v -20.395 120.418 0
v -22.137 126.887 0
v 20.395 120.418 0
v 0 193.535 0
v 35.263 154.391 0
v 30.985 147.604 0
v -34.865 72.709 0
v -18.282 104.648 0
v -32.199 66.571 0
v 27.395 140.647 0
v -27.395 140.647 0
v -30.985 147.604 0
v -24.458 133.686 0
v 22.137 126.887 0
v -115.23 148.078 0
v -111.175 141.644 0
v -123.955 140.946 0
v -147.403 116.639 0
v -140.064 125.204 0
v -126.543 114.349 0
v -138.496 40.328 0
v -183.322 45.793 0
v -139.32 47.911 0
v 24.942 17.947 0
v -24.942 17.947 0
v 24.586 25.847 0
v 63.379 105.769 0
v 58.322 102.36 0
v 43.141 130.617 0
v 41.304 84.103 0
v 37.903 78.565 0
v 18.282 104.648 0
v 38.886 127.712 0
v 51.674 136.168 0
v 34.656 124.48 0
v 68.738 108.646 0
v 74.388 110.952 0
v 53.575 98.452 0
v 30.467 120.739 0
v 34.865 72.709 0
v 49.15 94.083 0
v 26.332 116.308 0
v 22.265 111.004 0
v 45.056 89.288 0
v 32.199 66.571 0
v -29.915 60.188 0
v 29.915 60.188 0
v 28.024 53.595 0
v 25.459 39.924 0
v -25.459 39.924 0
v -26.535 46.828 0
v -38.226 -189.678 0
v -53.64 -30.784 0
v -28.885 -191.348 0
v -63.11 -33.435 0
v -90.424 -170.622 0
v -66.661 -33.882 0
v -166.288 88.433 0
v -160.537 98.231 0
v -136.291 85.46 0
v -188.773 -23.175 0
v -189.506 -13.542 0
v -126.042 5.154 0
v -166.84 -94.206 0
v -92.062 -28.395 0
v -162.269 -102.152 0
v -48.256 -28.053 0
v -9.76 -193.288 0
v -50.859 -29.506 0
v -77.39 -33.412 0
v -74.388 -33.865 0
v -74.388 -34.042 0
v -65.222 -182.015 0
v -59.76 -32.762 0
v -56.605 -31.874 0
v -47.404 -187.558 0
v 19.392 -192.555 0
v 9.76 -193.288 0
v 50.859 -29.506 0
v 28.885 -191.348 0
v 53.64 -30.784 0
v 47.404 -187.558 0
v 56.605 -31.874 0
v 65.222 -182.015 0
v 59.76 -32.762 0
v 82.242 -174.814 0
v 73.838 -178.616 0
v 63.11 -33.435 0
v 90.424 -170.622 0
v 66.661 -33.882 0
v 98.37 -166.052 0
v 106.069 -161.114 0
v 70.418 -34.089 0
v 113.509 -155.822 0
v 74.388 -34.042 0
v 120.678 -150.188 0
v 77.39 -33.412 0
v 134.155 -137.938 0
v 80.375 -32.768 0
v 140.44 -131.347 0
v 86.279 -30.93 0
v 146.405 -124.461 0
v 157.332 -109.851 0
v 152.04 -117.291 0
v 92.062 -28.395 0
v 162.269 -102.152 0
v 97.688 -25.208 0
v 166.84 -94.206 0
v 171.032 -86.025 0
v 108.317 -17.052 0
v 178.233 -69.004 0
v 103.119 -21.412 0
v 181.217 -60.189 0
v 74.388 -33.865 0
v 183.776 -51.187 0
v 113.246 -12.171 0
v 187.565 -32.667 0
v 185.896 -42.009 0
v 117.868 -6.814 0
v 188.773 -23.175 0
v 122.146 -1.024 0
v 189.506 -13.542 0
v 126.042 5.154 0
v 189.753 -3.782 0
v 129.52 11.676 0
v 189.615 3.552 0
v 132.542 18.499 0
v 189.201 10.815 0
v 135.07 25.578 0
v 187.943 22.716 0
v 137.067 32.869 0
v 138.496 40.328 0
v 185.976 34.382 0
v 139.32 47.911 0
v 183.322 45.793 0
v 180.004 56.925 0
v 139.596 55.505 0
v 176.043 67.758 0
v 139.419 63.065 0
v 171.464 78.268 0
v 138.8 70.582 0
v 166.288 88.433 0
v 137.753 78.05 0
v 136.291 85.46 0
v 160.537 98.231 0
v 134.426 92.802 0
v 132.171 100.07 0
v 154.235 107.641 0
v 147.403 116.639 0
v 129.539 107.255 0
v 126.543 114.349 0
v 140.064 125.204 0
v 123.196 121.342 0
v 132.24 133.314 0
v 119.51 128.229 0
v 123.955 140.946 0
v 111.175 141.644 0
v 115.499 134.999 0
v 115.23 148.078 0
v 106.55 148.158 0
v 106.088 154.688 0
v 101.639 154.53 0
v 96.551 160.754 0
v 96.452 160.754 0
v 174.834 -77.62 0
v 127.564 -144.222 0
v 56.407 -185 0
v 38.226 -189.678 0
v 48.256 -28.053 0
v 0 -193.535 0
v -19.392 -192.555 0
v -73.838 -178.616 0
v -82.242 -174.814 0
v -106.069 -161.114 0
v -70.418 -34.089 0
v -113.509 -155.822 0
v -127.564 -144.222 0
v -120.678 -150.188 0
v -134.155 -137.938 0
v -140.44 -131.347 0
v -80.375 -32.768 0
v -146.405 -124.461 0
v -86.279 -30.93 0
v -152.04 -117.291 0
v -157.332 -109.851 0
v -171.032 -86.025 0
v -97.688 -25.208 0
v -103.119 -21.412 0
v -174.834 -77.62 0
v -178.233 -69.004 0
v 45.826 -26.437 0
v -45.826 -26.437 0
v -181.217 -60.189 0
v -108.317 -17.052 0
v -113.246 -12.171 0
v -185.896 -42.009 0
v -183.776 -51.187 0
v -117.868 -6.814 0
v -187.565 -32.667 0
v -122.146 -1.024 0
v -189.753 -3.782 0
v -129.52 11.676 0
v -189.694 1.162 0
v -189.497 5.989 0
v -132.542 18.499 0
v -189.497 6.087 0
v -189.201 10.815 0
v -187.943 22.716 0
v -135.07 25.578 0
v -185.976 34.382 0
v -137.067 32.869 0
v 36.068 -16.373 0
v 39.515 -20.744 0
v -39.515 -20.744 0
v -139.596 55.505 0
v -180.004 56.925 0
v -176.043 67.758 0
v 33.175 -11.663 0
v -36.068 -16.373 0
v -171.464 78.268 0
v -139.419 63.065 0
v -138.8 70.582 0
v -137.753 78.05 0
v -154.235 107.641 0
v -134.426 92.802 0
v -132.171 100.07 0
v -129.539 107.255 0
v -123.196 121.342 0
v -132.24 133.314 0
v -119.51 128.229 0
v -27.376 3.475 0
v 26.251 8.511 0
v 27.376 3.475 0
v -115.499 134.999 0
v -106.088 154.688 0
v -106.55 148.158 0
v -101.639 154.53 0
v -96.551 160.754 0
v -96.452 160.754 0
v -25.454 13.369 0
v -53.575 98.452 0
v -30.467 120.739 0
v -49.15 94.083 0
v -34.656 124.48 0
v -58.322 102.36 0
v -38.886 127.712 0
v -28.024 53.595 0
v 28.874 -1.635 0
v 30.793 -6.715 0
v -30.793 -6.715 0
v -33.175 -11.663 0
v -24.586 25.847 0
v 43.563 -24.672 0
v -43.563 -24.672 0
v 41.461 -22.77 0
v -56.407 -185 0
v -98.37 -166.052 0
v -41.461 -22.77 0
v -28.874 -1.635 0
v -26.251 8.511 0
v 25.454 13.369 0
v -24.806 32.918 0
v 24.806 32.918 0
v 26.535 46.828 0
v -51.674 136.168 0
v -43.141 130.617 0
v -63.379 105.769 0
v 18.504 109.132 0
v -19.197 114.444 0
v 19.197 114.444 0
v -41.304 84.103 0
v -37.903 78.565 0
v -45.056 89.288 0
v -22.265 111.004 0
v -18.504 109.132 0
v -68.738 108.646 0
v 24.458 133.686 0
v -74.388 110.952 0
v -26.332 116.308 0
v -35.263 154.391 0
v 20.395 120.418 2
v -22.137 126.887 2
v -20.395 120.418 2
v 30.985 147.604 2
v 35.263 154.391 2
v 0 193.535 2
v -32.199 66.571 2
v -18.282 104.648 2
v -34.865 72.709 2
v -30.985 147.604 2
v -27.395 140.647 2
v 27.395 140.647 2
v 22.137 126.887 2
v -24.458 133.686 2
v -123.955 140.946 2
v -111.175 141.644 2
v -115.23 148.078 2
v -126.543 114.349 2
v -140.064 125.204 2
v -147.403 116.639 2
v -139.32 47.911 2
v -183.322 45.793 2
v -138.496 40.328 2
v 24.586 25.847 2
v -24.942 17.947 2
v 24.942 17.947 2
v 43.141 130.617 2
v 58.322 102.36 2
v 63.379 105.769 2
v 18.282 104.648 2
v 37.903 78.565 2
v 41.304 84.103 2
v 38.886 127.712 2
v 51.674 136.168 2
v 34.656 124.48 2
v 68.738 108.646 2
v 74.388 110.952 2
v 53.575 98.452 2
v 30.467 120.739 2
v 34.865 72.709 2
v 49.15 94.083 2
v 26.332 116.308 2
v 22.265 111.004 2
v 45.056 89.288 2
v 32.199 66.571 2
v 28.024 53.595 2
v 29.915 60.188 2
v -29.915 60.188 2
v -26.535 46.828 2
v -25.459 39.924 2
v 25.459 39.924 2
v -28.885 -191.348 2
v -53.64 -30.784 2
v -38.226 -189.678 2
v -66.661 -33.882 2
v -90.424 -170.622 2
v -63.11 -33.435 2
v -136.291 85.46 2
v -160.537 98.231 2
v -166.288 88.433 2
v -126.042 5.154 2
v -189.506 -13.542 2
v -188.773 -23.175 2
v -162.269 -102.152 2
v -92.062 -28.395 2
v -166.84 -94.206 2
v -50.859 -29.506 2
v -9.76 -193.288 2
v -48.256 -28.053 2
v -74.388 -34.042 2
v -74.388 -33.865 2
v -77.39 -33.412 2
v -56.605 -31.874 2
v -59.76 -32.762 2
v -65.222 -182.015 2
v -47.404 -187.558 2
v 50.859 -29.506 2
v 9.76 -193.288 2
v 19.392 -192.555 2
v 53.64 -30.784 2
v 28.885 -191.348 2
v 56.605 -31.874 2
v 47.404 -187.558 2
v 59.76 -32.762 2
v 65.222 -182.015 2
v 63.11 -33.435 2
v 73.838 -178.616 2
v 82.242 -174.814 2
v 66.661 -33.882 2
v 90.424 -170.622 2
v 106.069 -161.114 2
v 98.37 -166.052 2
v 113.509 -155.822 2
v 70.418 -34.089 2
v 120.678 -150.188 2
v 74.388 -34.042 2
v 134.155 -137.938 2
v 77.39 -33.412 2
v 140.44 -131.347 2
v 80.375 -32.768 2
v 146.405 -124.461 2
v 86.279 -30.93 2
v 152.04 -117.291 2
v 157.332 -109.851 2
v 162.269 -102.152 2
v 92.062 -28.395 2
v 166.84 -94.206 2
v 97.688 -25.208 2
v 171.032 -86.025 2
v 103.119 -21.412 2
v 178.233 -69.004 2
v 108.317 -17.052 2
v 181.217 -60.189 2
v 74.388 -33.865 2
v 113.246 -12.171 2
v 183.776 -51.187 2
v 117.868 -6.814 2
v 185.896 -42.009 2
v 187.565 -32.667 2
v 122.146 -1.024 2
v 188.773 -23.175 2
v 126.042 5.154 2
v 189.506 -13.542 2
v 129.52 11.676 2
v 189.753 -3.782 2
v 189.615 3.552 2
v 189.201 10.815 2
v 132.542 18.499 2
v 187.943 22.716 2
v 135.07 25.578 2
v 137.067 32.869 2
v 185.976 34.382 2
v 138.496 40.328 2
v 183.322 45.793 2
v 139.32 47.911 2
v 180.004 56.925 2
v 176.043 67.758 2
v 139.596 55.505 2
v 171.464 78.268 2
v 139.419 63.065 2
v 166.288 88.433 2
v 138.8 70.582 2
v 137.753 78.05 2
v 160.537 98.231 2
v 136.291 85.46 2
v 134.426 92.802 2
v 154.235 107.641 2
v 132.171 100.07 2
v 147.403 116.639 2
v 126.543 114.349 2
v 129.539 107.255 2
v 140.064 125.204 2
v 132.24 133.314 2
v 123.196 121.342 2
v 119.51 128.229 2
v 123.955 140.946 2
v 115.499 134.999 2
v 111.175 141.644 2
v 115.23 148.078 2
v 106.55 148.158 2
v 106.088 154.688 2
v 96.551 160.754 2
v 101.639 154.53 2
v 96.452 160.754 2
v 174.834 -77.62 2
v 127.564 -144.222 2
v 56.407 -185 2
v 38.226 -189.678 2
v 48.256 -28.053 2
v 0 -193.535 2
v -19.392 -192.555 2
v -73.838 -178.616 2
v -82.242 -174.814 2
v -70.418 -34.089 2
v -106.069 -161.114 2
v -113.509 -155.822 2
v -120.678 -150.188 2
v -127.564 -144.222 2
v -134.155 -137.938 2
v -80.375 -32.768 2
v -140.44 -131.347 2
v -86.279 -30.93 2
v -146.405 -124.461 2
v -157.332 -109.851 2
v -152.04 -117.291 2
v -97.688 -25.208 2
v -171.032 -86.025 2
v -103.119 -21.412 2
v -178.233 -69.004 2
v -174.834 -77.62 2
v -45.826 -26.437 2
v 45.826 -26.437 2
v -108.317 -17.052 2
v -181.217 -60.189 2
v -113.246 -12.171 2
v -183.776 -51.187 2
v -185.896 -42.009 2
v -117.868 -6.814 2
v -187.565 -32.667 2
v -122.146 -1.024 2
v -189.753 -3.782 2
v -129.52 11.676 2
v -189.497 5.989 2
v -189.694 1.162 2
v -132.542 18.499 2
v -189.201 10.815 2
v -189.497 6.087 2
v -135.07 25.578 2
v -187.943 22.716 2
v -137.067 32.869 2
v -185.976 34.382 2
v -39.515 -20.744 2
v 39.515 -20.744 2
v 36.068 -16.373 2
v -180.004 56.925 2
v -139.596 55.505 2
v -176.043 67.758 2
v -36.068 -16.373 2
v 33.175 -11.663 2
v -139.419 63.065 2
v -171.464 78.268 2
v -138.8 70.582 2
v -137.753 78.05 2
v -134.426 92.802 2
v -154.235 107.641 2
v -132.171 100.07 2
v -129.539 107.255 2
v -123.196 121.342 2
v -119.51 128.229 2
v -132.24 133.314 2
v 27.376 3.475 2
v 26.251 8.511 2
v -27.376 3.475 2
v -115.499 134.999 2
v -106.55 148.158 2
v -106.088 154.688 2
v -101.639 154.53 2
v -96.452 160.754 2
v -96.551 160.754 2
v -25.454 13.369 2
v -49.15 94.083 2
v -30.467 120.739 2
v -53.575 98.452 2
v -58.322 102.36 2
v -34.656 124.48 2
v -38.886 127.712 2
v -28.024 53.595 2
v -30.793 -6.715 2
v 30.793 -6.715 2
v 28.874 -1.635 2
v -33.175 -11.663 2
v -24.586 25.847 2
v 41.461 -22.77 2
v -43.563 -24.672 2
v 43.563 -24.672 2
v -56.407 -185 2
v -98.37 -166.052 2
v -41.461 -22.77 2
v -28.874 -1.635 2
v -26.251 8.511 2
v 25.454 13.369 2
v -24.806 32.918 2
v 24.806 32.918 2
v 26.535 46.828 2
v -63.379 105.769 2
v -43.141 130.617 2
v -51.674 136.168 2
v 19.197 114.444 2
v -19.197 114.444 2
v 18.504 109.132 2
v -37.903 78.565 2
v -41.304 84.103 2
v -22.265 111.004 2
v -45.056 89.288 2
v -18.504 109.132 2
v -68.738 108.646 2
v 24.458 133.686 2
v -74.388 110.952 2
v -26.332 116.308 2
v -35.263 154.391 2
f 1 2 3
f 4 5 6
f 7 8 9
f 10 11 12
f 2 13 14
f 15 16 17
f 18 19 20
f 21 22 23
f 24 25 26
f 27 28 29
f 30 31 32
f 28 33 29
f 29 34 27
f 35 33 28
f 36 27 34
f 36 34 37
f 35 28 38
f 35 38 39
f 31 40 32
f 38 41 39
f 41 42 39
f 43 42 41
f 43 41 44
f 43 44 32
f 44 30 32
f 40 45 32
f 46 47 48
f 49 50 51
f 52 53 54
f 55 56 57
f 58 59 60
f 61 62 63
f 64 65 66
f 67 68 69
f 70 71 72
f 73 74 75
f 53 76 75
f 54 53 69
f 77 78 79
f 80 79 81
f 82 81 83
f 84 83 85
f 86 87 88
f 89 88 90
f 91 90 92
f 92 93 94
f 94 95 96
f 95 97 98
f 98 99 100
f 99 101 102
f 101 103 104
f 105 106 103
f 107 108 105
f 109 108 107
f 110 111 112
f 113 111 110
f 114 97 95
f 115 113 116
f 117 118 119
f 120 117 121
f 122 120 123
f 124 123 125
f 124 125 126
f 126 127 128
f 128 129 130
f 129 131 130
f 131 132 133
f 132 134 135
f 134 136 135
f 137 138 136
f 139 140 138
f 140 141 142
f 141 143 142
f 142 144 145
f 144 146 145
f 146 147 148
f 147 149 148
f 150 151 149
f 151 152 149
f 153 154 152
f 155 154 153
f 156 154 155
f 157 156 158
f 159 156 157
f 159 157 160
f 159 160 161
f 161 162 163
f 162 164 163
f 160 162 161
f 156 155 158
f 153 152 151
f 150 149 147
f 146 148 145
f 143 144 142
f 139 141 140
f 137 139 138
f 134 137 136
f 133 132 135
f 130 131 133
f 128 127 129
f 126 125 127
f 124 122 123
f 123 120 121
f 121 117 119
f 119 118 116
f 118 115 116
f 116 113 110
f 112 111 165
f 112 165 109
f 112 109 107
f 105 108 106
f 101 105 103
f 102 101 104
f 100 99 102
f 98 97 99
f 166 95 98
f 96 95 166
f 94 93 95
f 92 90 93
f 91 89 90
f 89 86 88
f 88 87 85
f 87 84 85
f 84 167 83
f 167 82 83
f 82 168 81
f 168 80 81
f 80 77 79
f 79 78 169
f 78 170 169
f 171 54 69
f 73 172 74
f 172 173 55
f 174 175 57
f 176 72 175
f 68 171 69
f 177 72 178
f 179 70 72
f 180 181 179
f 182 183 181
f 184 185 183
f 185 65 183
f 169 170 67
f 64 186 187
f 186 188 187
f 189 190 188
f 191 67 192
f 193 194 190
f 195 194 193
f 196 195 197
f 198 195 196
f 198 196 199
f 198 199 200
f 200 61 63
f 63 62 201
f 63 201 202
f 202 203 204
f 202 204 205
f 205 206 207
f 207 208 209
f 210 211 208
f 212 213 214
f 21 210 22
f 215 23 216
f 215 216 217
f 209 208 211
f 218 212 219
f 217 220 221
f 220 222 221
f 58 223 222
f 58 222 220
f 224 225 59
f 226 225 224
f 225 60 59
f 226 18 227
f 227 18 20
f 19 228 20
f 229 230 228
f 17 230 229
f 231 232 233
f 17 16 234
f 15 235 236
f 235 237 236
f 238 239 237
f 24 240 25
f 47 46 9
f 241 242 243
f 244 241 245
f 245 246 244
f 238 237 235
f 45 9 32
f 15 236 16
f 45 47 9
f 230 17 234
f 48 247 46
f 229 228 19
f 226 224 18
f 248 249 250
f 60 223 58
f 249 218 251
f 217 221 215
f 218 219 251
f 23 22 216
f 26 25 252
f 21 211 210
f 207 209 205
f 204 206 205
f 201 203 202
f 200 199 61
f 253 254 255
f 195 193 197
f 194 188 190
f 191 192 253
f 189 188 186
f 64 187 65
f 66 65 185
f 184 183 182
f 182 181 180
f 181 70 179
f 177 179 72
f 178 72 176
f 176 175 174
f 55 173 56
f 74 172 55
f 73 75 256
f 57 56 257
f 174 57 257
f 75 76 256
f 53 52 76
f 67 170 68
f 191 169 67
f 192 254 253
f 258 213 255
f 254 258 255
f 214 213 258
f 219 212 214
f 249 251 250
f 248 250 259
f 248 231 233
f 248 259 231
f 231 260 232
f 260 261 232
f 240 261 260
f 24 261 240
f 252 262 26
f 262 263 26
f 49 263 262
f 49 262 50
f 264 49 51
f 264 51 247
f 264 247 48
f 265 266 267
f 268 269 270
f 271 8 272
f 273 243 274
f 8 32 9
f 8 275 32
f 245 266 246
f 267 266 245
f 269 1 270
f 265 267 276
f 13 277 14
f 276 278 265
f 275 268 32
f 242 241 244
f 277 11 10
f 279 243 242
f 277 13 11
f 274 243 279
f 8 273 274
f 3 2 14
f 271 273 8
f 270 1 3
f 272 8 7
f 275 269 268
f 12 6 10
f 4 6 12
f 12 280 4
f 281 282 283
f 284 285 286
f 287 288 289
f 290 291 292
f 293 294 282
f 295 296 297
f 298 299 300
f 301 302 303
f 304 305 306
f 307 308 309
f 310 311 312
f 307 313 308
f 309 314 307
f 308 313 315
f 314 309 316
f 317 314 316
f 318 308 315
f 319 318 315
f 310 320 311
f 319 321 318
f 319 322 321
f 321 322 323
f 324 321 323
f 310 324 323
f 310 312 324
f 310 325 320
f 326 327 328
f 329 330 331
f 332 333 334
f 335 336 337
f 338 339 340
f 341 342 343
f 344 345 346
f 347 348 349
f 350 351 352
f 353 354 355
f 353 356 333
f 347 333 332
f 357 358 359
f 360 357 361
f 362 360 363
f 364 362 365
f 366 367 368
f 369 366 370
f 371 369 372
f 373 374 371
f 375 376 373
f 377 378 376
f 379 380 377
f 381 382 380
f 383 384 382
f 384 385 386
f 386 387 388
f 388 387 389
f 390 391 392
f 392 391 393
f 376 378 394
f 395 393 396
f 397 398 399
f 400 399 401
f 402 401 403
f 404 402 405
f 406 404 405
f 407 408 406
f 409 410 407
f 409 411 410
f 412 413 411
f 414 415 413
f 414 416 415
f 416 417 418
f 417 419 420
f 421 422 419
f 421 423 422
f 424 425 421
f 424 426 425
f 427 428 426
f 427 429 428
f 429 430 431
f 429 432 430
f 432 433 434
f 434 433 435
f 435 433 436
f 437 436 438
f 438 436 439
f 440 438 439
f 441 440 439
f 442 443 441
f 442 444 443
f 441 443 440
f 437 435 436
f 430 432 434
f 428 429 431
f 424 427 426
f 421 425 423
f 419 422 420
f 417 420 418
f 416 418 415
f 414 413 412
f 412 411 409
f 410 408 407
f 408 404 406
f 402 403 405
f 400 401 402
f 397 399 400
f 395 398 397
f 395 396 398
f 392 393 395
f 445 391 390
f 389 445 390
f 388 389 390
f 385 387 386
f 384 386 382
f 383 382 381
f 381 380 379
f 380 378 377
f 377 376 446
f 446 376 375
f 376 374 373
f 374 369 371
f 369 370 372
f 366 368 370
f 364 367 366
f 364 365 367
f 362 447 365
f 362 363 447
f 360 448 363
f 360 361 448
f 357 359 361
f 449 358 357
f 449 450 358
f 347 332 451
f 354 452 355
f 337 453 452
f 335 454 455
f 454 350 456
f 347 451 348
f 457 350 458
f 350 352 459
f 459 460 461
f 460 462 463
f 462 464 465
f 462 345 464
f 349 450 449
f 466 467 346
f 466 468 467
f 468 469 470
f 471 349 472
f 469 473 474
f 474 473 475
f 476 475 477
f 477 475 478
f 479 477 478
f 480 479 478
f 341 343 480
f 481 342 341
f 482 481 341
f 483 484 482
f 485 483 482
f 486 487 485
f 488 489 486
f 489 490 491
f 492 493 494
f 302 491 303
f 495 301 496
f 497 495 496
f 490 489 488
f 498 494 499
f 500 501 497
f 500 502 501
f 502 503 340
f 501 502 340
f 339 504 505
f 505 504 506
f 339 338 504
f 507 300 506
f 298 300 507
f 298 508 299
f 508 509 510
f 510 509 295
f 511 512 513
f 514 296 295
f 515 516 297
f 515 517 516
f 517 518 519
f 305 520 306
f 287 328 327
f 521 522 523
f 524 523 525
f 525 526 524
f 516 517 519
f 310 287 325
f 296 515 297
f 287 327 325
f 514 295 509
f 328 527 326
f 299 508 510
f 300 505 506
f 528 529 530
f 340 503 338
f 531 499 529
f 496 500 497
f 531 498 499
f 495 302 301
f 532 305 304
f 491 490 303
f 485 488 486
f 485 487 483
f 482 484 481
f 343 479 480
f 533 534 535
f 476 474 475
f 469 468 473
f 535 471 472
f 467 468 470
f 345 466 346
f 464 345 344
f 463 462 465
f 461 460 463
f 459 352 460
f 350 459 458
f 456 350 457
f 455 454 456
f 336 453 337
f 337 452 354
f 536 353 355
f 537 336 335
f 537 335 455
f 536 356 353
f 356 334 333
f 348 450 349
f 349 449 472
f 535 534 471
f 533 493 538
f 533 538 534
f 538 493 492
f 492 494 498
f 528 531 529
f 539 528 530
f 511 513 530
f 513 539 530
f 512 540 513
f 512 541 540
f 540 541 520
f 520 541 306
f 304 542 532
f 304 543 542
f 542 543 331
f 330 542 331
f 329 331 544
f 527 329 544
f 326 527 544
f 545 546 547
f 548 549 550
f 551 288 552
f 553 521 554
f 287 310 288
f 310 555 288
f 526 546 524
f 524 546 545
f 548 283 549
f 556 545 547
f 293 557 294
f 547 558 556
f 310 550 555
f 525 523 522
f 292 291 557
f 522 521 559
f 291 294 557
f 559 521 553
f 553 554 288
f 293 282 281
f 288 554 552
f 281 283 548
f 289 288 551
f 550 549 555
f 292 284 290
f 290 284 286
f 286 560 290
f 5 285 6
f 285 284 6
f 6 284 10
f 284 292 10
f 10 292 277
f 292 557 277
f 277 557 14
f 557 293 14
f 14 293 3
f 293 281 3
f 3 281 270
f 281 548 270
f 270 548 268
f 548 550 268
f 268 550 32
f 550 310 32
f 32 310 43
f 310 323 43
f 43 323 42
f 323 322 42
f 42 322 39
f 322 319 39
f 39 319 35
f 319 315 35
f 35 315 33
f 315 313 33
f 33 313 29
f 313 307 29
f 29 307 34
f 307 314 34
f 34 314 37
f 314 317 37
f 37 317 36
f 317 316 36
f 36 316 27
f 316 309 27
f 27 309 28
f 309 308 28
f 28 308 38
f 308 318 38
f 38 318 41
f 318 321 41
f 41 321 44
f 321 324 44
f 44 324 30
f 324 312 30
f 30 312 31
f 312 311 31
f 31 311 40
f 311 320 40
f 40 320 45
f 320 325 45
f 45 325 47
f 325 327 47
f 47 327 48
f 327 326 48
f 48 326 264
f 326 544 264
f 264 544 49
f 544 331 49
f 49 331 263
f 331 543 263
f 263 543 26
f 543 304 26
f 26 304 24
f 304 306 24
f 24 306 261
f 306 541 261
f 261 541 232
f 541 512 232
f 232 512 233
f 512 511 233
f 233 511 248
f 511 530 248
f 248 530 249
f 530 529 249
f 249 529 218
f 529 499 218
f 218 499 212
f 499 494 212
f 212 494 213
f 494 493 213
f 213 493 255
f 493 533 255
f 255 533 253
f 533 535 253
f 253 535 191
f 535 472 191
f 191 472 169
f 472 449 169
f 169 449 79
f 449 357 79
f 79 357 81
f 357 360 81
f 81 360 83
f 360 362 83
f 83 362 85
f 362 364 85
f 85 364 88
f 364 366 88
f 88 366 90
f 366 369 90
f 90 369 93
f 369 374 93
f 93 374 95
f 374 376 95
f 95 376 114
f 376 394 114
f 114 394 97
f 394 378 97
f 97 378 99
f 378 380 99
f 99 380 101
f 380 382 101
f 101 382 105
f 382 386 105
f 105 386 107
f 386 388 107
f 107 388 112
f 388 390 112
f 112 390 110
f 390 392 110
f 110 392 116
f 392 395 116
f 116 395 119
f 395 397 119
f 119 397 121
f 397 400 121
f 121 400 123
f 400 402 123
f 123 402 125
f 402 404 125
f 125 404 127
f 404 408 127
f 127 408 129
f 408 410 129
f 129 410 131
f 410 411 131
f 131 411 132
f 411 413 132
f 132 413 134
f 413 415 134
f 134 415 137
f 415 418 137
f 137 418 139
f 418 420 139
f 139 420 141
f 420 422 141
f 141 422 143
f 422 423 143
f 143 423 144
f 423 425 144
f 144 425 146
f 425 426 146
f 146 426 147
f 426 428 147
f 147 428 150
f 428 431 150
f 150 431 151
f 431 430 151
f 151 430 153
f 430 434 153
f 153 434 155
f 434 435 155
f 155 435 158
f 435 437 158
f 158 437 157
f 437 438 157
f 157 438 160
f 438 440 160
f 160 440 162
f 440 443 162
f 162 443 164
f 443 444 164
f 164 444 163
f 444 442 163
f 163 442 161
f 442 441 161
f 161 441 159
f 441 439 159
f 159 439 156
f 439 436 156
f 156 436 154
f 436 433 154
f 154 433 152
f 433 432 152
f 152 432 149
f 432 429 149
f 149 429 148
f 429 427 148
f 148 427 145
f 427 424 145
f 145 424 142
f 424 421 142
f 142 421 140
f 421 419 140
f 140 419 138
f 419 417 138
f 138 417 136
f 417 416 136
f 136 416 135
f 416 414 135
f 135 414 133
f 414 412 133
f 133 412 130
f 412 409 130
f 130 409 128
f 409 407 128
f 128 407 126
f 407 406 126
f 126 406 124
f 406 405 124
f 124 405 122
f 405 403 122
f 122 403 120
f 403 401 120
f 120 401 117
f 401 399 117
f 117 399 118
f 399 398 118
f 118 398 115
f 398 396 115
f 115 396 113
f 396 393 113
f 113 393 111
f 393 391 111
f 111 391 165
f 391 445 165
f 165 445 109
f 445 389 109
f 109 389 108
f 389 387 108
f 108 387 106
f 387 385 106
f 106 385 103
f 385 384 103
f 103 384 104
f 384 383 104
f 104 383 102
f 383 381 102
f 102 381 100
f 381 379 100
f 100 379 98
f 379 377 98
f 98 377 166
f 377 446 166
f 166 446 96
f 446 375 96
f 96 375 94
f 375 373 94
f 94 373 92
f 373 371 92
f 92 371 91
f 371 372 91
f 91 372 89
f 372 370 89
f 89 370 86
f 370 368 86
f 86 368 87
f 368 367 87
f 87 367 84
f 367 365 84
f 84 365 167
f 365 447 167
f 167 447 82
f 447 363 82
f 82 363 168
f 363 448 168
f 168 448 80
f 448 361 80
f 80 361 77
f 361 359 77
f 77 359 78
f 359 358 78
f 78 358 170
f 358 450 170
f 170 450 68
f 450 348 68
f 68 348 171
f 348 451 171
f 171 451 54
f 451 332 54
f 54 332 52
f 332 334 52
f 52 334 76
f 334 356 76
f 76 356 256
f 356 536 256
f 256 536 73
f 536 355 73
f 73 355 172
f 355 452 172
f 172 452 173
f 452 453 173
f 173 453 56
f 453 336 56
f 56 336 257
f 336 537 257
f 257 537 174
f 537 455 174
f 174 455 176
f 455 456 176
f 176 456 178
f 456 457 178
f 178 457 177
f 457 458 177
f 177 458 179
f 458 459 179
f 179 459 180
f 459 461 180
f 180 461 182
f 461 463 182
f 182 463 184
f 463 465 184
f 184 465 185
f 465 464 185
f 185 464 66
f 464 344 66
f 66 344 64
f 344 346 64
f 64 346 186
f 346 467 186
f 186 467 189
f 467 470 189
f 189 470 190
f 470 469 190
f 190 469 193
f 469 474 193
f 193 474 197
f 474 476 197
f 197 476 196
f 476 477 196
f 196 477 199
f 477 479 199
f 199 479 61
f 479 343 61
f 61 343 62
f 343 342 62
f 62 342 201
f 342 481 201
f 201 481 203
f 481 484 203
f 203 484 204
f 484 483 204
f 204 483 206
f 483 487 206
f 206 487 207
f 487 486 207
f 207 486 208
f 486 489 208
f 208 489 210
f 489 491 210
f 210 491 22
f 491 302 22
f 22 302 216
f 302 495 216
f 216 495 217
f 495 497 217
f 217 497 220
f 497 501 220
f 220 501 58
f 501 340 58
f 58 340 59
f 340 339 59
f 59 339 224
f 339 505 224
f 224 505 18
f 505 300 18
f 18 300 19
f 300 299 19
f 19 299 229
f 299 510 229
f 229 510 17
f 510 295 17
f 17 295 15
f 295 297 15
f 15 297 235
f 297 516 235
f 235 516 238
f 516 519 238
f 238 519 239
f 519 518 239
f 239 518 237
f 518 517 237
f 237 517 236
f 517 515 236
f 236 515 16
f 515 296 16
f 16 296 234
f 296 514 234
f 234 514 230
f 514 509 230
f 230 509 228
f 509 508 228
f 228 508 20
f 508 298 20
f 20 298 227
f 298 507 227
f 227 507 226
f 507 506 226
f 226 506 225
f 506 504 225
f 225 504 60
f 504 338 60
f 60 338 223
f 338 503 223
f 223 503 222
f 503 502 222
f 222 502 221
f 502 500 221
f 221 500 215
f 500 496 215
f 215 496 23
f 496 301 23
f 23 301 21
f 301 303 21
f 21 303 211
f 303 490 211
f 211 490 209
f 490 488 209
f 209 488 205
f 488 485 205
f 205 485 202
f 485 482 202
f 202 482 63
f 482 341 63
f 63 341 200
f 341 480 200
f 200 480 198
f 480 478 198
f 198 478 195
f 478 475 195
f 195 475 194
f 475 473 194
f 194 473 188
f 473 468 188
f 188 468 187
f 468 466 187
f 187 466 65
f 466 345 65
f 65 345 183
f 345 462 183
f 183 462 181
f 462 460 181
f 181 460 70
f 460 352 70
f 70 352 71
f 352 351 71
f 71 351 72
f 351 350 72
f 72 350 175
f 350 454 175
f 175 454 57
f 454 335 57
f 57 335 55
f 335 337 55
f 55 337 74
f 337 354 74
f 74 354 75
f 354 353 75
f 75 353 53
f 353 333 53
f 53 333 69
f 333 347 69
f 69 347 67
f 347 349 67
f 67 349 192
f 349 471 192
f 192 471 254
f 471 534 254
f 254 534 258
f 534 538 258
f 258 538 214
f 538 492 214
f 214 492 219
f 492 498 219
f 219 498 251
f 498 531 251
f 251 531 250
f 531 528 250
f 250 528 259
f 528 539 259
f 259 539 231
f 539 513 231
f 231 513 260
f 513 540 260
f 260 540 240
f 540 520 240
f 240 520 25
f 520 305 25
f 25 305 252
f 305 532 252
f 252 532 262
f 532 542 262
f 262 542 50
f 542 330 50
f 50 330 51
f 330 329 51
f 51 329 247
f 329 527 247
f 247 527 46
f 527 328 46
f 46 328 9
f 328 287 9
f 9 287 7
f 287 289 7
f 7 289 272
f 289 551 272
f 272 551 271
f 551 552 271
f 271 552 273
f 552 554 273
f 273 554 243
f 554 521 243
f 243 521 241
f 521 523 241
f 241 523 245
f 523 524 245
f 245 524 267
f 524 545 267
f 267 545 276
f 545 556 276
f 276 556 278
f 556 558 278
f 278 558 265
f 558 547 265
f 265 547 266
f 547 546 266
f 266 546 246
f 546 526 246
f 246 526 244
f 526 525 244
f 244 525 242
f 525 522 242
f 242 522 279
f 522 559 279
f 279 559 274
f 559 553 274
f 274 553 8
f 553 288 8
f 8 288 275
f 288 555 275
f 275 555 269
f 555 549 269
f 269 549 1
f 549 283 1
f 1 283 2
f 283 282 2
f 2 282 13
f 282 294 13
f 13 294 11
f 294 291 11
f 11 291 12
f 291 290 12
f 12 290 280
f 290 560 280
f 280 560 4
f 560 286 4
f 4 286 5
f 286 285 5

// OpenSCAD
rebel(2,25.4*7.5);
*translate([0,-2]) color("blue") linear_extrude(1) circle(r=85,$fn=100);

module rebel(h,br=85) {
  scale([25.4/90*br/85, -25.4/90*br/85, 1]) union()
  {
    linear_extrude(height=h)
      polygon([[-0.000010,-305.979990],[-55.751670,-244.092592],[-48.986665,-233.362447],[-43.311376,-222.363158],[-38.667947,-211.357817],[-34.998520,-200.609517],[-32.245236,-190.381351],[-30.350239,-180.936413],[-29.255669,-172.537795],[-28.903670,-165.448590],[-35.201822,-175.498281],[-41.630860,-183.882768],[-48.168334,-190.888873],[-54.791792,-196.803416],[-61.478784,-201.913218],[-68.206858,-206.505101],[-81.696450,-215.282393],[-117.607990,-175.415190],[-108.675605,-171.768918],[-100.203113,-167.221835],[-92.206574,-161.830882],[-84.702047,-155.652998],[-77.705593,-148.745123],[-71.233271,-141.164196],[-65.301141,-132.967157],[-59.925262,-124.210945],[-55.121695,-114.952501],[-50.906498,-105.248763],[-47.295732,-95.156672],[-44.305457,-84.733167],[-41.951731,-74.035188],[-40.250615,-63.119674],[-39.218168,-52.043565],[-38.870450,-40.863800],[-39.433022,-28.374190],[-40.243551,-21.136593],[-41.502294,-13.455160],[-43.280789,-5.493407],[-45.650576,2.585145],[-48.683192,10.616978],[-52.450177,18.438575],[-57.023070,25.886416],[-62.473410,32.796983],[-65.549977,35.999689],[-68.872734,39.006758],[-72.450621,41.797748],[-76.292582,44.352222],[-80.407559,46.649738],[-84.804493,48.669856],[-89.492328,50.392138],[-94.480006,51.796143],[-99.776468,52.861432],[-105.390658,53.567564],[-111.331518,53.894100],[-117.607990,53.820600],[-117.607990,53.540400],[-122.353256,52.823949],[-127.073076,51.806001],[-136.406888,48.900435],[-145.550440,44.893350],[-154.444751,39.854394],[-163.030837,33.853213],[-171.249716,26.959455],[-179.042403,19.242768],[-186.349916,10.772800],[-193.113272,1.619197],[-199.273488,-8.148393],[-204.771580,-18.460323],[-209.548566,-29.246944],[-213.545462,-40.438610],[-216.703285,-51.965673],[-218.963052,-63.758485],[-220.265780,-75.747400],[-220.702403,-87.752949],[-220.421478,-99.705196],[-219.443264,-111.591128],[-217.788022,-123.397733],[-215.476012,-135.111997],[-212.527495,-146.720908],[-208.962731,-158.211454],[-204.801980,-169.570620],[-200.065503,-180.785396],[-194.773560,-191.842767],[-188.946412,-202.729721],[-182.604318,-213.433245],[-175.767540,-223.940327],[-168.456337,-234.237954],[-160.690970,-244.313113],[-152.491700,-254.152791],[-152.647440,-254.152791],[-167.724962,-244.562379],[-182.178617,-234.111660],[-195.972876,-222.835689],[-209.072210,-210.769517],[-221.441092,-197.948199],[-233.043994,-184.406787],[-243.845388,-170.180335],[-253.809745,-155.303895],[-262.901538,-139.812521],[-271.085238,-123.741266],[-278.325317,-107.125182],[-284.586247,-89.999324],[-289.832501,-72.398743],[-294.028550,-54.358494],[-297.138865,-35.913628],[-299.127920,-17.099200],[-299.595100,-9.624200],[-299.595100,-9.468400],[-299.906560,-1.837600],[-300.000000,5.980000],[-299.609400,21.410461],[-298.450196,36.639211],[-296.541285,51.647353],[-293.901564,66.415991],[-290.549929,80.926230],[-286.505277,95.159171],[-281.786504,109.095919],[-276.412506,122.717578],[-270.402180,136.005252],[-263.774422,148.940043],[-256.548130,161.503055],[-248.742199,173.675393],[-240.375525,185.438159],[-231.467006,196.772457],[-222.035537,207.659392],[-212.100016,218.080066],[-201.679339,228.015583],[-190.792401,237.447047],[-179.458100,246.355562],[-167.695333,254.722231],[-155.522994,262.528157],[-142.959982,269.754444],[-130.025192,276.382197],[-116.737521,282.392518],[-103.115866,287.766511],[-89.179122,292.485280],[-74.946186,296.529929],[-60.435956,299.881561],[-45.667326,302.521279],[-30.659195,304.430187],[-15.430457,305.589390],[-0.000010,305.979990],[15.430435,305.589390],[30.659171,304.430187],[45.667302,302.521279],[60.435931,299.881561],[74.946161,296.529929],[89.179096,292.485280],[103.115840,287.766511],[116.737496,282.392518],[130.025167,276.382197],[142.959958,269.754444],[155.522971,262.528157],[167.695310,254.722231],[179.458079,246.355562],[190.792381,237.447047],[201.679320,228.015583],[212.099999,218.080066],[222.035521,207.659392],[231.466991,196.772457],[240.375512,185.438159],[248.742187,173.675393],[256.548120,161.503055],[263.774414,148.940043],[270.402173,136.005252],[276.412500,122.717578],[281.786499,109.095919],[286.505273,95.159171],[290.549927,80.926230],[293.901562,66.415991],[296.541284,51.647353],[298.450195,36.639211],[299.609399,21.410461],[300.000000,5.980000],[299.781400,-5.614950],[299.127800,-17.099200],[297.138764,-35.913628],[294.028464,-54.358494],[289.832431,-72.398743],[284.586191,-89.999324],[278.325272,-107.125182],[271.085203,-123.741266],[262.901511,-139.812521],[253.809725,-155.303895],[243.845373,-170.180335],[233.043982,-184.406787],[221.441080,-197.948199],[209.072197,-210.769517],[195.972859,-222.835689],[182.178595,-234.111660],[167.724933,-244.562379],[152.647400,-254.152791],[152.491600,-254.152791],[160.690887,-244.313113],[168.456265,-234.237954],[175.767476,-223.940327],[182.604259,-213.433245],[188.946356,-202.729721],[194.773505,-191.842767],[200.065448,-180.785396],[204.801925,-169.570620],[208.962676,-158.211454],[212.527442,-146.720908],[215.475962,-135.111997],[217.787978,-123.397733],[219.443229,-111.591128],[220.421457,-99.705196],[220.702400,-87.752949],[220.265800,-75.747400],[218.963058,-63.758485],[216.703279,-51.965673],[213.545445,-40.438610],[209.548541,-29.246944],[204.771549,-18.460323],[199.273452,-8.148393],[193.113233,1.619197],[186.349876,10.772800],[179.042364,19.242768],[171.249679,26.959455],[163.030806,33.853213],[154.444726,39.854394],[145.550424,44.893350],[136.406881,48.900435],[127.073082,51.806001],[122.353269,52.823949],[117.608010,53.540400],[117.608010,53.820600],[111.331534,53.894100],[105.390671,53.567564],[99.776478,52.861432],[94.480012,51.796143],[89.492332,50.392138],[84.804494,48.669856],[80.407558,46.649738],[76.292579,44.352222],[72.450616,41.797748],[68.872726,39.006758],[65.549968,35.999689],[62.473398,32.796983],[57.023056,25.886416],[52.450160,18.438575],[48.683172,10.616978],[45.650553,2.585145],[43.280764,-5.493407],[41.502266,-13.455160],[40.243521,-21.136593],[39.432989,-28.374190],[38.870410,-40.863800],[39.218129,-52.043565],[40.250578,-63.119674],[41.951698,-74.035188],[44.305429,-84.733167],[47.295710,-95.156672],[50.906483,-105.248763],[55.121686,-114.952501],[59.925260,-124.210945],[65.301145,-132.967157],[71.233281,-141.164196],[77.705608,-148.745123],[84.702066,-155.652998],[92.206595,-161.830882],[100.203136,-167.221835],[108.675627,-171.768918],[117.608010,-175.415190],[81.696410,-215.282393],[68.206807,-206.505101],[61.478729,-201.913218],[54.791735,-196.803416],[48.168275,-190.888873],[41.630801,-183.882768],[35.201762,-175.498281],[28.903610,-165.448590],[29.255609,-172.537795],[30.350179,-180.936413],[32.245176,-190.381351],[34.998460,-200.609517],[38.667887,-211.357817],[43.311316,-222.363158],[48.986605,-233.362447],[55.751610,-244.092592],[-0.000010,-305.979990]]);
  }
}
